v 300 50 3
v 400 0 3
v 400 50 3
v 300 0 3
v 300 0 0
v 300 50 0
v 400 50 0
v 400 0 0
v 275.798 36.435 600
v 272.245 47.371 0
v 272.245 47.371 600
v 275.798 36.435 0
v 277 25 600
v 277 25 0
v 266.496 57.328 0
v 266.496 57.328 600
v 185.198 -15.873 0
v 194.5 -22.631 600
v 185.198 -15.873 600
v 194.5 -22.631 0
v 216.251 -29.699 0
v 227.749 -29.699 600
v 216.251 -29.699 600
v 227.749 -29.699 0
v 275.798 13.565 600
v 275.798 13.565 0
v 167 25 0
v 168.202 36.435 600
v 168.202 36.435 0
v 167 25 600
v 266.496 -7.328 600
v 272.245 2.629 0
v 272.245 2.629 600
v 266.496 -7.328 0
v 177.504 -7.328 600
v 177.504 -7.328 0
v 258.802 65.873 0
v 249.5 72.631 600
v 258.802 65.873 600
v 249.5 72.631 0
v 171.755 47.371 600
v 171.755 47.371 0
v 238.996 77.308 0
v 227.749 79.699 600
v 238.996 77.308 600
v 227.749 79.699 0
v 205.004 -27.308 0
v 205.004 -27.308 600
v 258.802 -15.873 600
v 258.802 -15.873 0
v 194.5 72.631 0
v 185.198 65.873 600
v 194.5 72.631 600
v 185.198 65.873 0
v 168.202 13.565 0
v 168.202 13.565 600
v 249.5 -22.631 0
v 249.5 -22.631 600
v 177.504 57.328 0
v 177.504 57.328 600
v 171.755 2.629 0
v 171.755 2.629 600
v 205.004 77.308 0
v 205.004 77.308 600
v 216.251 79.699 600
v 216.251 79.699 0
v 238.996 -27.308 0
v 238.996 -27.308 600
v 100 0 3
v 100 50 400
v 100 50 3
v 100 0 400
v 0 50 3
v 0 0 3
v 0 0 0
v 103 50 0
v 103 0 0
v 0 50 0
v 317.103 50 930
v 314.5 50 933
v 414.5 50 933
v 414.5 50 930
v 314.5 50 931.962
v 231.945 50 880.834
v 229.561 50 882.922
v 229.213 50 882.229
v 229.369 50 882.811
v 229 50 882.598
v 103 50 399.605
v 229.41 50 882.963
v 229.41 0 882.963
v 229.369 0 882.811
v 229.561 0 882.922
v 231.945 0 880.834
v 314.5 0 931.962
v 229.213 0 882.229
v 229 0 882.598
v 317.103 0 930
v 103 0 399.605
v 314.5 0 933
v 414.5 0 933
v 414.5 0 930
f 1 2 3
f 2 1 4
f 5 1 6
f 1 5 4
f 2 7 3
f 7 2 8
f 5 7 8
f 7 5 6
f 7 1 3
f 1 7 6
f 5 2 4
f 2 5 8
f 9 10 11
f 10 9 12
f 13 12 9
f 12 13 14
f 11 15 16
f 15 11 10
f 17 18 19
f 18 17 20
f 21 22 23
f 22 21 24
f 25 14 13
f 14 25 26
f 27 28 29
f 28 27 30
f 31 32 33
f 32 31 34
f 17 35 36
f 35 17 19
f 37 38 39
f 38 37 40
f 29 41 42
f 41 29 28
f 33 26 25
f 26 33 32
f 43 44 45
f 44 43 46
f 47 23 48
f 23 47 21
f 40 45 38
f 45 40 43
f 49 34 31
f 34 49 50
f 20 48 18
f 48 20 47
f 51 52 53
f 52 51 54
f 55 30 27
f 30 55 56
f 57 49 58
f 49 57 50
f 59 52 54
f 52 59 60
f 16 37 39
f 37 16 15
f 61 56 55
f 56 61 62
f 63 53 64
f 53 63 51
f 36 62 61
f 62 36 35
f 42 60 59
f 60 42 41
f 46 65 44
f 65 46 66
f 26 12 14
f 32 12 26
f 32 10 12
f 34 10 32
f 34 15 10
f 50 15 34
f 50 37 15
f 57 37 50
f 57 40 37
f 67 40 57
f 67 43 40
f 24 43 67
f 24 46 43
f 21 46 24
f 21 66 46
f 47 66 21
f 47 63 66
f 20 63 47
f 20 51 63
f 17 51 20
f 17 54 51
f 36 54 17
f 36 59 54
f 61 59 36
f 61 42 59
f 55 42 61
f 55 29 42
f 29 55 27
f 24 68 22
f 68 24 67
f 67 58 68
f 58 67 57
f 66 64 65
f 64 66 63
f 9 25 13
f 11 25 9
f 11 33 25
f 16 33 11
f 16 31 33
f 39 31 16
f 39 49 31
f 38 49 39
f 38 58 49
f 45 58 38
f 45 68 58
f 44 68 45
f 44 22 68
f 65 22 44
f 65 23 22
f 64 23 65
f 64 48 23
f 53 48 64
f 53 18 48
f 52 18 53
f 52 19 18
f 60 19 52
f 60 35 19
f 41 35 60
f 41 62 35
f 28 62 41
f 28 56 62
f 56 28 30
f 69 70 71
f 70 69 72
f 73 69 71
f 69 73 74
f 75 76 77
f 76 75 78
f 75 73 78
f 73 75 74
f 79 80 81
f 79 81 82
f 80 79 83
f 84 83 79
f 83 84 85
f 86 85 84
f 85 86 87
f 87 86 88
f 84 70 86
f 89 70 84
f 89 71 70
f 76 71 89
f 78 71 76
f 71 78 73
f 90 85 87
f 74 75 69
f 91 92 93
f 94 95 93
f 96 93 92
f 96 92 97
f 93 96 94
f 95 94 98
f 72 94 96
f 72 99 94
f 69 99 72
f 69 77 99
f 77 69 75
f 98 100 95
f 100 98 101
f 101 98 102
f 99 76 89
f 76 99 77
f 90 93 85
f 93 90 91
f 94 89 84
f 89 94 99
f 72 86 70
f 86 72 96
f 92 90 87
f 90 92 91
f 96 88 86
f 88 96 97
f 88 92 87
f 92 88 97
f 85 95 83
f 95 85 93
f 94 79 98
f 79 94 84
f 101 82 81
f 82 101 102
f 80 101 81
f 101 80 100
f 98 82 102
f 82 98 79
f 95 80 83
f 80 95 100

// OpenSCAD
// variables en mm
epaisseur = 3;
largeur = 50;
// cylindre intérieur

translate([222,25,0])
    cylinder(600,55,55,false);
// premiere branche
cube([100,largeur,epaisseur],[0,0,0]);
translate([100,0,0])
    cube([epaisseur,largeur,400]);
translate([100,0,0])
    translate([0,0,400])
        rotate([0,15,0])    
            cube([epaisseur,largeur,500]);
translate([0,0,880])
    translate([230.5,0,0])
        rotate([0,-30,0])
            cube([100,largeur,epaisseur]);
translate([0,0,930])
    translate([314.5,0,0])
        cube([100,largeur,epaisseur]);
translate([0,0,933])
    translate([414.5,0,0])
        rotate([0,90,0])
            difference()
            {
                polyhedron(
                    points = [
                    [0,0,0],     //0
                    [epaisseur,0,0,],    //1
                    [epaisseur,largeur,0],   //2
                    [0,largeur,0],   //3
                    [0,0.75 * largeur,65],   //4
                    [epaisseur,0.75 * largeur,65] ,  //5
                    ],
                    faces = [
                    [4,0,3],
                    [0,4,5,1],
                    [0,1,2,3],
                    [3,2,4,5],
                    [1,5,2]
                    ]
                );
                translate([0,largeur/2,15])
                    rotate([0,90,0])
                        cylinder(6*epaisseur, 5,5);
            };
 // seconde branche
 translate([300,0,0])
    {
        cube([100,largeur,epaisseur],[0,0,0]);
        polyhedron(
        points = [
        [ 0,0,0 ], //0
        [ epaisseur,0,0 ], //1
        [ epaisseur,largeur,0 ], //2
        [ 0,largeur,0 ], //3
        [ 0,0,650], //4
        [ epaisseur,0,650 ], //5
        [ epaisseur,largeur,720 ], //6
        [ 0,largeur,720 ], //7
        ],
        faces = [
        [ 0,3,7,4 ] ,
        [ 0,1,2,3 ] ,
        [ 3,2,6,7 ] ,
        [ 7,6,5,4 ] ,
        [ 4,5,1,0 ] ,
        [ 1,2,6,5 ] ,
        ]
        );
        //echo(atan(70/largeur));
        //translate([0,0,500])
            //rotate([ 0,-45,0])
                //rotate([0,0,-atan(70/largeur)])
                    polyhedron(
                    points = [
                    [ 0,0,650 ] , // 0
                    [ epaisseur,0,650 ] , // 1
                    [ epaisseur,largeur,720 ] , // 2
                    [ 0,largeur,720 ] , // 3
                    [ -105,0, 750] , // 4
                    [ -105+epaisseur, 0, 750 ] , // 5
                    [ -85+epaisseur, largeur, 820] , // 6
                    [ -85, largeur, 820 ] , // 7
                    ] ,
                    faces = [
                    [ 0,3,7,4 ] ,
                    [ 0,1,2,3 ] ,
                    [ 3,2,6,7 ] ,
                    [ 7,6,5,4 ] ,
                    [ 4,5,1,0 ] ,
                    [ 1,2,6,5 ] ,
                    ]
                    );
    }
